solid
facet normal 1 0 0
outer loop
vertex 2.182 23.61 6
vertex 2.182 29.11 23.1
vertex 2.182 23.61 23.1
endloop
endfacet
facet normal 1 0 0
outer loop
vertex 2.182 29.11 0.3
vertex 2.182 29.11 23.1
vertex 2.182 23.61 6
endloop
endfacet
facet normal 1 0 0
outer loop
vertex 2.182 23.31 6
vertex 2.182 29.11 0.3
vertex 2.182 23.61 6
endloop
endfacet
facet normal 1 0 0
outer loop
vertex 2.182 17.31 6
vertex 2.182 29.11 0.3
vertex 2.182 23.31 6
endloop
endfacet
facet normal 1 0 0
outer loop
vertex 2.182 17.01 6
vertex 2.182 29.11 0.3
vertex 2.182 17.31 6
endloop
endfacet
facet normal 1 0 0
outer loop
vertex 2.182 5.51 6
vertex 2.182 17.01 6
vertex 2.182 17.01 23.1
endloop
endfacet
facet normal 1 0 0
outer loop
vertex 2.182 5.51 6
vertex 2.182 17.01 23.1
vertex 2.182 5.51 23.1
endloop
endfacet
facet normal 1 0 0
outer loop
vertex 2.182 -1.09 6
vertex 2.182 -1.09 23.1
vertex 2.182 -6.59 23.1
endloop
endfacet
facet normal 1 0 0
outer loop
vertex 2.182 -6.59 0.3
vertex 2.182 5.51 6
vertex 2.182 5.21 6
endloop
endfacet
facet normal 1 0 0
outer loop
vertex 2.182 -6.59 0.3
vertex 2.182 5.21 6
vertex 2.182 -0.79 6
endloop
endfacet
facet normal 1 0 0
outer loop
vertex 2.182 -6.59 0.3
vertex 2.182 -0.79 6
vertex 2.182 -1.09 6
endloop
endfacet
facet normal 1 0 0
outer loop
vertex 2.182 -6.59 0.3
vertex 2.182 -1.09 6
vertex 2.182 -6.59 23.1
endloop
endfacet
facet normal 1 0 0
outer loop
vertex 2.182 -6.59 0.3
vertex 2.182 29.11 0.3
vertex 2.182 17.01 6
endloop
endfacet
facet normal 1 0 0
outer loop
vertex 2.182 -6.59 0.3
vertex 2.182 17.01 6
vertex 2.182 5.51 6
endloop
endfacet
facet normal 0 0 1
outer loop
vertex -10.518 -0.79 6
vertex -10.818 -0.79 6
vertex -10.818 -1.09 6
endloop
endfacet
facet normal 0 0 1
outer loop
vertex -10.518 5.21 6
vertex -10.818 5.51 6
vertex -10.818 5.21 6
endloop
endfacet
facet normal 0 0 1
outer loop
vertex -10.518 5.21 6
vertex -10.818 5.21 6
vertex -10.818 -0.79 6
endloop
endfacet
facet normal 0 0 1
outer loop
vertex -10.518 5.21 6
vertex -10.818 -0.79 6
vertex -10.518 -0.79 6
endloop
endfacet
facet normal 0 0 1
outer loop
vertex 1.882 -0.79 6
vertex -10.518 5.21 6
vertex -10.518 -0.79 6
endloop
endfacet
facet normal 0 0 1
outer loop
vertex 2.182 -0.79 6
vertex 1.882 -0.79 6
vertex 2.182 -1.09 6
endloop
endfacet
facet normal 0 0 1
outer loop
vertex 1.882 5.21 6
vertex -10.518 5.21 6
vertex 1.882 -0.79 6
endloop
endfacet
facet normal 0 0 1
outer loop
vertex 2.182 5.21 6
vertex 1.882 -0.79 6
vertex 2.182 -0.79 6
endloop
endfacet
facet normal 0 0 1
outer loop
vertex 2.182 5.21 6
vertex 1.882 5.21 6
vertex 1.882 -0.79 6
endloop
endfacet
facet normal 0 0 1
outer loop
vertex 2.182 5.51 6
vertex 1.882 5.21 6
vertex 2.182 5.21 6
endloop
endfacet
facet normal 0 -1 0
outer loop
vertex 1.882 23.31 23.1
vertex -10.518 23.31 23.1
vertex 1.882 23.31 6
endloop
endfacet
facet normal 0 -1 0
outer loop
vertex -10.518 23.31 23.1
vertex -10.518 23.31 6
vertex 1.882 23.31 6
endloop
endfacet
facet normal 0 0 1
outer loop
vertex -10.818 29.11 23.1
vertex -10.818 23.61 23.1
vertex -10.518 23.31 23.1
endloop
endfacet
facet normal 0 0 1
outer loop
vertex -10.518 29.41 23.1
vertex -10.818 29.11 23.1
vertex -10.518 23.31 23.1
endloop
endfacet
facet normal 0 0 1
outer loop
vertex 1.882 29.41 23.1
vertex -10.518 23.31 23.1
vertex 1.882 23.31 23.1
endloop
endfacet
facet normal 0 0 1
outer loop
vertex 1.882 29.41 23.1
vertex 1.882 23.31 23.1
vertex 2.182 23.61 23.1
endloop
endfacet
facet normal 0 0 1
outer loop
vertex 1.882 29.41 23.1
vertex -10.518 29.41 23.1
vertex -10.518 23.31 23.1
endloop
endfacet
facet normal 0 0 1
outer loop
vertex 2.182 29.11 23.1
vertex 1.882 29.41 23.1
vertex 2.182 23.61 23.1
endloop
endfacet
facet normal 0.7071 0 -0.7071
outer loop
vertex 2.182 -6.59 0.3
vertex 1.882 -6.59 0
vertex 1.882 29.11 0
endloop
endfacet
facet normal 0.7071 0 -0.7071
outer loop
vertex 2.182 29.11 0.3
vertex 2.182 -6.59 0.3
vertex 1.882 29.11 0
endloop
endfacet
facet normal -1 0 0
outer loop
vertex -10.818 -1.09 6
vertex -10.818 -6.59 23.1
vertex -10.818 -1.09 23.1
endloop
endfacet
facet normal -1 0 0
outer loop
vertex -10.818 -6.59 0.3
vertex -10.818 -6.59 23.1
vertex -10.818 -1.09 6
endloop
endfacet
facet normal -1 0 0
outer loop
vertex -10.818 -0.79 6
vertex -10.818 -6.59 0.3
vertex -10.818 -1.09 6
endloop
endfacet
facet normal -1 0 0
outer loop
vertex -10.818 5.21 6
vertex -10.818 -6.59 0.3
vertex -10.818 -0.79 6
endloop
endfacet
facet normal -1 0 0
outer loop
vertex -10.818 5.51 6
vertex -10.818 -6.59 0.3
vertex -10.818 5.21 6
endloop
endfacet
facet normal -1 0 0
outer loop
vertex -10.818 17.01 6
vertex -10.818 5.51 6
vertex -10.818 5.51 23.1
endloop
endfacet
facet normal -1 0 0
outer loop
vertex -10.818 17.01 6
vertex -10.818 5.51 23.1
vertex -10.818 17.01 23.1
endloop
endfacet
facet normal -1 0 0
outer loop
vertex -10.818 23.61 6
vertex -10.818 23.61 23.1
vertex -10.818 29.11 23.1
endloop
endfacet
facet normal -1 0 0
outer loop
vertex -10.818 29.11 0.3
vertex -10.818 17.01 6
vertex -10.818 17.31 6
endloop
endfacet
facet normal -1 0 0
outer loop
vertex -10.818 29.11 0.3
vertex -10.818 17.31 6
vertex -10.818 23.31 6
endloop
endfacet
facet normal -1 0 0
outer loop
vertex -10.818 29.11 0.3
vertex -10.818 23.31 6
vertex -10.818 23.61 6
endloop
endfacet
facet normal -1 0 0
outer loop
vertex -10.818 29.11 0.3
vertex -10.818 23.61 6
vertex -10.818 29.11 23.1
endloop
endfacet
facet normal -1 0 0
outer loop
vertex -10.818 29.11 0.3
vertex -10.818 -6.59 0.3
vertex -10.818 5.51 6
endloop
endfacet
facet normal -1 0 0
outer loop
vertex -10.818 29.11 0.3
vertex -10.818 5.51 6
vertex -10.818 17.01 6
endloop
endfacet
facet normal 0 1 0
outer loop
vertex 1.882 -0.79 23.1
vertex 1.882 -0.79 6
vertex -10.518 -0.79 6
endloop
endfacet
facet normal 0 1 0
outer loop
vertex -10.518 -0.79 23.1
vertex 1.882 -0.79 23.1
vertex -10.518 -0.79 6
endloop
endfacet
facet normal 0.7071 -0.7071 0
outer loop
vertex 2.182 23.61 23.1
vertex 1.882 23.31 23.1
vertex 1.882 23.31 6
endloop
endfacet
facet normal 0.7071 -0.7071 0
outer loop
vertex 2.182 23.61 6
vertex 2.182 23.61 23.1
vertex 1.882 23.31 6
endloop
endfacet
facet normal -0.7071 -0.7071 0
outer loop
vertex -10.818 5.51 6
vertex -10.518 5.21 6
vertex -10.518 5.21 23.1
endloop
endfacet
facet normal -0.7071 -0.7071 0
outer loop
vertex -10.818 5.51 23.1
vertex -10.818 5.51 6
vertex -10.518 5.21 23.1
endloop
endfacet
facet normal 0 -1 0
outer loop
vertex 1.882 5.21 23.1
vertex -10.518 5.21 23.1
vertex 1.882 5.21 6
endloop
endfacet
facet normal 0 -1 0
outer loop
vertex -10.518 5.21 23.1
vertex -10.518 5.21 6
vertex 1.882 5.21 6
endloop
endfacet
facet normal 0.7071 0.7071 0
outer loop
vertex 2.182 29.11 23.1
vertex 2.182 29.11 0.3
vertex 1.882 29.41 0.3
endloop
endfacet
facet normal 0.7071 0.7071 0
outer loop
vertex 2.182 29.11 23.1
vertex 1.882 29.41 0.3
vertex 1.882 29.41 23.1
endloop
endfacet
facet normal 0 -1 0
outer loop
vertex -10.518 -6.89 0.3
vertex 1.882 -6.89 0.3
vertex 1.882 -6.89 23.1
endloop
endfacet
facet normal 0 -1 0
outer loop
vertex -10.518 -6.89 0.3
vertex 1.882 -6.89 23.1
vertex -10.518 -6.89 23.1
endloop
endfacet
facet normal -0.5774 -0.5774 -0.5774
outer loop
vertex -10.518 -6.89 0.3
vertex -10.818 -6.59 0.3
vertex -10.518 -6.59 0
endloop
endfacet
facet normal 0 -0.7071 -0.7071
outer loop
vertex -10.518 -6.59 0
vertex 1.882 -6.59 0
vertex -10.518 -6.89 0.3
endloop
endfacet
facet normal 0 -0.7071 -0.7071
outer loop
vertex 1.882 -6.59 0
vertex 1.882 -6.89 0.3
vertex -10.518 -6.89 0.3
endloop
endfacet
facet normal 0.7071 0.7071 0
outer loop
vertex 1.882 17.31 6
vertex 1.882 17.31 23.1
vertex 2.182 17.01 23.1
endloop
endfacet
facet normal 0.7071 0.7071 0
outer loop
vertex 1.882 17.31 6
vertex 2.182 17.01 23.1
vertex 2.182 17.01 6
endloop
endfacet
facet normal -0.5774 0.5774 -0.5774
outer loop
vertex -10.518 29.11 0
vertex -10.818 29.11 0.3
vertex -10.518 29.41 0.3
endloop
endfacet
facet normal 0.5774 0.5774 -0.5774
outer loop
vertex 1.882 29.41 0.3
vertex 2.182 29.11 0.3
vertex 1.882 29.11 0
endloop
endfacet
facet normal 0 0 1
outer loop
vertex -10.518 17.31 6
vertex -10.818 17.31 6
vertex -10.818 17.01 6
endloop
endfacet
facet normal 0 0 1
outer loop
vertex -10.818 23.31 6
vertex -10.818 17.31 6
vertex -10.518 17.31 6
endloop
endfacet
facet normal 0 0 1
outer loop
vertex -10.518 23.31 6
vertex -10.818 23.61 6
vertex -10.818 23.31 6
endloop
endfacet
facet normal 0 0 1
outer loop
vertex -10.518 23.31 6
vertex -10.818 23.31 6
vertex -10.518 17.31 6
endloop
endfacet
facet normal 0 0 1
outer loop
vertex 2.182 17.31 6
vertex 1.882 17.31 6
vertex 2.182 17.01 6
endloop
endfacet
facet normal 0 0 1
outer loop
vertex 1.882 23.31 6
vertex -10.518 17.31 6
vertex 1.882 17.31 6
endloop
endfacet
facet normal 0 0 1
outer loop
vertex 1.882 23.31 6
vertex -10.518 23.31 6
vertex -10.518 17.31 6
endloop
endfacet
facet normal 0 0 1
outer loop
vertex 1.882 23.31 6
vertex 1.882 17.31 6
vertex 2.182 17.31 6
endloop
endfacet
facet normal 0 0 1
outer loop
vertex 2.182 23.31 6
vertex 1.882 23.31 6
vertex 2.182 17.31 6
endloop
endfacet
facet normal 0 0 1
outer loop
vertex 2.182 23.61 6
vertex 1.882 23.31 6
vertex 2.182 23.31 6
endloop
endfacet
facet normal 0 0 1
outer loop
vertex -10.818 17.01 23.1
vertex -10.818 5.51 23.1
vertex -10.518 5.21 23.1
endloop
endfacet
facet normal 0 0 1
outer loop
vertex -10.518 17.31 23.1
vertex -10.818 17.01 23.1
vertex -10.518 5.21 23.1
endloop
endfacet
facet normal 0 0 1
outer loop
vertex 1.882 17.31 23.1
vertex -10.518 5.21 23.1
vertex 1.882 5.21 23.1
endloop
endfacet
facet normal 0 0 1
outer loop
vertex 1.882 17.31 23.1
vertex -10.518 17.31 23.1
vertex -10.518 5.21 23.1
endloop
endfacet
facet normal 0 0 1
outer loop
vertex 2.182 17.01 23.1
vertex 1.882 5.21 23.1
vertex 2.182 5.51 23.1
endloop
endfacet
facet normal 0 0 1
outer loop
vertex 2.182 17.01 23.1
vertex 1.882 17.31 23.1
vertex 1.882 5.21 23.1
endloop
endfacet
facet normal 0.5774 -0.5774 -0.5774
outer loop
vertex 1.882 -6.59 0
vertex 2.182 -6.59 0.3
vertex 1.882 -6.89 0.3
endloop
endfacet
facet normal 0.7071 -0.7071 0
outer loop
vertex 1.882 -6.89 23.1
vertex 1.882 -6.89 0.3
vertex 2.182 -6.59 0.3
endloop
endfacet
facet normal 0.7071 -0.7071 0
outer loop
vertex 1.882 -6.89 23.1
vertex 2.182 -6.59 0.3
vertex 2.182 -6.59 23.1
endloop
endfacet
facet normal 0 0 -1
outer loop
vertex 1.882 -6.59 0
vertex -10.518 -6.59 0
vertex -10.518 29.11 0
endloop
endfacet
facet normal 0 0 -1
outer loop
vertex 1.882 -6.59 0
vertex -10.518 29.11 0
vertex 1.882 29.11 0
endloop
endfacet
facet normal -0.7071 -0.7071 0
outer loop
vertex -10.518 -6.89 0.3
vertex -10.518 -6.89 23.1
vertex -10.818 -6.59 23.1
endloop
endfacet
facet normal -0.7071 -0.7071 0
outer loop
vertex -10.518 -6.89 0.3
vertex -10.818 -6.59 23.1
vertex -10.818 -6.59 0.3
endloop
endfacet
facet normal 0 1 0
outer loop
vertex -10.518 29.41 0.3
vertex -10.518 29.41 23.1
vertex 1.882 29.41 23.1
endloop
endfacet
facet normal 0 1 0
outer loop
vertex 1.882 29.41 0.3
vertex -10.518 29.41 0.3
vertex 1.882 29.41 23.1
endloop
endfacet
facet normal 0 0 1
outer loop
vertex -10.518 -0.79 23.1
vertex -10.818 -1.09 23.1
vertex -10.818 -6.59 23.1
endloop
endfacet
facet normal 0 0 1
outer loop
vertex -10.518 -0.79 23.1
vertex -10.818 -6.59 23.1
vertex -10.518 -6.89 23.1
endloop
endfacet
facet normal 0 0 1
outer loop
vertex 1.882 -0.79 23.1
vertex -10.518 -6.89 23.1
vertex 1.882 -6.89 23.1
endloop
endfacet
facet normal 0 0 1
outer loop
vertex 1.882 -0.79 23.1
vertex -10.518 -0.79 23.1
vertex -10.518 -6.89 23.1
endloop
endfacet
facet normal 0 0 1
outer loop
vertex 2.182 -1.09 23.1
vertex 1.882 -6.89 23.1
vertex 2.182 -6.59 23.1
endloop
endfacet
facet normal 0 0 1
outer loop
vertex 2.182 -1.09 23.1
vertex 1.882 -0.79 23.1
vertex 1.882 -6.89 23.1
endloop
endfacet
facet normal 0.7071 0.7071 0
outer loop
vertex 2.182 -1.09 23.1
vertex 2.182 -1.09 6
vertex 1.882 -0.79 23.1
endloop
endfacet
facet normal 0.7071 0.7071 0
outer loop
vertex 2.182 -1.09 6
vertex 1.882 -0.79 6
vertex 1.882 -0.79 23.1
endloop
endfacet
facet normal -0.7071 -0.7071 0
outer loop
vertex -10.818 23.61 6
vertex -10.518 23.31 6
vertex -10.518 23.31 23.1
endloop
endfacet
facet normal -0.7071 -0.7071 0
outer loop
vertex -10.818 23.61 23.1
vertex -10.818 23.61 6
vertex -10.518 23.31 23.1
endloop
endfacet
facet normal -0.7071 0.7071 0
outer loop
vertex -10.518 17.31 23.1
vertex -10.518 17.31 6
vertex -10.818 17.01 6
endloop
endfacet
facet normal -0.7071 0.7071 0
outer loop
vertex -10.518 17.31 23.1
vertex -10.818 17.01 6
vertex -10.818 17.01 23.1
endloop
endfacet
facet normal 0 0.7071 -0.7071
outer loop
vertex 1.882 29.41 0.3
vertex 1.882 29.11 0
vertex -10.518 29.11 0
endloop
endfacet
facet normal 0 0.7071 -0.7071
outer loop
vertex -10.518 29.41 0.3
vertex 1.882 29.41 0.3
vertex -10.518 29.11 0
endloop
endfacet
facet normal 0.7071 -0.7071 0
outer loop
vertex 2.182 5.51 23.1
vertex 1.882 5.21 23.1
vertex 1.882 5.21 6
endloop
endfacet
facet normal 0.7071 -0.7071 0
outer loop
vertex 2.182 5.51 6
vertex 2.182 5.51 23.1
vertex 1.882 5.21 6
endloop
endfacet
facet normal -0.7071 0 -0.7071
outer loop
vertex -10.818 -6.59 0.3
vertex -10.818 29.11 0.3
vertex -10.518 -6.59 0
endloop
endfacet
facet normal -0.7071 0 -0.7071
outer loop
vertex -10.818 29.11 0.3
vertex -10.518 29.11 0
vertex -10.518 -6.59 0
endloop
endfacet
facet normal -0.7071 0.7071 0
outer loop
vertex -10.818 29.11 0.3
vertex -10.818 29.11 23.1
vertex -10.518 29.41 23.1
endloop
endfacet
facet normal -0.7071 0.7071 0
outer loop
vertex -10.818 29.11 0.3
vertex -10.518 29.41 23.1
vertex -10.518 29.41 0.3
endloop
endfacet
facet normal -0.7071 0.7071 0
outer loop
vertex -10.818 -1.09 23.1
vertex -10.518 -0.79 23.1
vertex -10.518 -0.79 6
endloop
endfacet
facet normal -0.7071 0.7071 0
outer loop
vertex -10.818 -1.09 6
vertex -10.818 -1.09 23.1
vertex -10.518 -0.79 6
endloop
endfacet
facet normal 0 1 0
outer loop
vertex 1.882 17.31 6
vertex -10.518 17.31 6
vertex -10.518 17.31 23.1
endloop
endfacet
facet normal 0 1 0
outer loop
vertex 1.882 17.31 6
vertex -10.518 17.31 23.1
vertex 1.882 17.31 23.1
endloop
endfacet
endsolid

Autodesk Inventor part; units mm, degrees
ref_plane "YZ Plane" through (0, 0, 0) normal (1, 0, 0) x (0, 1, 0)
ref_plane "XZ Plane" through (0, 0, 0) normal (0, 1, 0) x (-1, 0, 0)
ref_plane "XY Plane" through (0, 0, 0) normal (0, 0, 1) x (1, 0, 0)
sketch "Sketch1" plane through (0, 0, 0) normal (0, 0, 1) x (1, 0, 0)
  line L0 (-10.8185, 29.4098) -> (2.1815, 29.4098)
  line L1 (2.1815, 29.4098) -> (2.1815, -6.8902)
  line L2 (2.1815, -6.8902) -> (-10.8185, -6.8902)
  line L3 (-10.8185, -6.8902) -> (-10.8185, 29.4098)
  point P0 (0, 0)
  dimension "d0" = 13
  dimension "d1" = 36.3
extrude "Extrusion1" add sketch "Sketch1" along normal blind 6
sketch "Sketch2" plane through (0, 0, 6) normal (0, 0, 1) x (1, 0, 0)
  line L0 (2.1815, 29.4098) -> (-10.8185, 29.4098) projected
  line L1 (-10.8185, 29.4098) -> (-10.8185, -6.8902) projected
  line L2 (-10.8185, -6.8902) -> (2.1815, -6.8902) projected
  line L3 (2.1815, -6.8902) -> (2.1815, 29.4098) projected
  line L4 (2.1815, -0.7902) -> (-10.8185, -0.7902)
  line L5 (-10.8185, 29.4098) -> (-10.8185, -6.8902) projected
  line L6 (-10.8185, 5.2098) -> (2.1815, 5.2098)
  line L7 (2.1815, -6.8902) -> (2.1815, 29.4098) projected
  line L8 (-10.8185, 17.3098) -> (2.1815, 17.3098)
  line L9 (-10.8185, 23.3098) -> (2.1815, 23.3098)
  point P0 (0, 0)
  dimension "d4" = 6.1
  dimension "d5" = 6.1
  dimension "d6" = 12.1
  dimension "d7" = 12.1
  dimension "d8" = 36.3
extrude "Extrusion2" add sketch "Sketch2" along normal blind 17.1 contours L3 L9 L1 L0 | L3 L6 L1 L8 | L3 L2 L1 L4
chamfer "Chamfer1" distance 0.3 angle 45 16 edges at (-10.8185, 29.4098, 11.55) (-10.8185, 23.3098, 14.55) (-10.8185, 17.3098, 14.55) (2.1815, 17.3098, 14.55) (2.1815, 5.2098, 14.55) (-10.8185, 5.2098, 14.55) (-10.8185, -0.7902, 14.55) (2.1815, -0.7902, 14.55) (-10.8185, -6.8902, 11.55) (2.1815, -6.8902, 11.55) (2.1815, 29.4098, 11.55) (2.1815, 23.3098, 14.55) (-10.8185, 11.2598, 0) (2.1815, 11.2598, 0) (-4.3185, 29.4098, 0) (-4.3185, -6.8902, 0)
equation "\"d5\" = d4"
equation "\"d7\" = -0.5 * d6 + 0.5 * d8"
properties part number "COTS_GENERIC_Transformer_Core" material "Stainless Steel"
